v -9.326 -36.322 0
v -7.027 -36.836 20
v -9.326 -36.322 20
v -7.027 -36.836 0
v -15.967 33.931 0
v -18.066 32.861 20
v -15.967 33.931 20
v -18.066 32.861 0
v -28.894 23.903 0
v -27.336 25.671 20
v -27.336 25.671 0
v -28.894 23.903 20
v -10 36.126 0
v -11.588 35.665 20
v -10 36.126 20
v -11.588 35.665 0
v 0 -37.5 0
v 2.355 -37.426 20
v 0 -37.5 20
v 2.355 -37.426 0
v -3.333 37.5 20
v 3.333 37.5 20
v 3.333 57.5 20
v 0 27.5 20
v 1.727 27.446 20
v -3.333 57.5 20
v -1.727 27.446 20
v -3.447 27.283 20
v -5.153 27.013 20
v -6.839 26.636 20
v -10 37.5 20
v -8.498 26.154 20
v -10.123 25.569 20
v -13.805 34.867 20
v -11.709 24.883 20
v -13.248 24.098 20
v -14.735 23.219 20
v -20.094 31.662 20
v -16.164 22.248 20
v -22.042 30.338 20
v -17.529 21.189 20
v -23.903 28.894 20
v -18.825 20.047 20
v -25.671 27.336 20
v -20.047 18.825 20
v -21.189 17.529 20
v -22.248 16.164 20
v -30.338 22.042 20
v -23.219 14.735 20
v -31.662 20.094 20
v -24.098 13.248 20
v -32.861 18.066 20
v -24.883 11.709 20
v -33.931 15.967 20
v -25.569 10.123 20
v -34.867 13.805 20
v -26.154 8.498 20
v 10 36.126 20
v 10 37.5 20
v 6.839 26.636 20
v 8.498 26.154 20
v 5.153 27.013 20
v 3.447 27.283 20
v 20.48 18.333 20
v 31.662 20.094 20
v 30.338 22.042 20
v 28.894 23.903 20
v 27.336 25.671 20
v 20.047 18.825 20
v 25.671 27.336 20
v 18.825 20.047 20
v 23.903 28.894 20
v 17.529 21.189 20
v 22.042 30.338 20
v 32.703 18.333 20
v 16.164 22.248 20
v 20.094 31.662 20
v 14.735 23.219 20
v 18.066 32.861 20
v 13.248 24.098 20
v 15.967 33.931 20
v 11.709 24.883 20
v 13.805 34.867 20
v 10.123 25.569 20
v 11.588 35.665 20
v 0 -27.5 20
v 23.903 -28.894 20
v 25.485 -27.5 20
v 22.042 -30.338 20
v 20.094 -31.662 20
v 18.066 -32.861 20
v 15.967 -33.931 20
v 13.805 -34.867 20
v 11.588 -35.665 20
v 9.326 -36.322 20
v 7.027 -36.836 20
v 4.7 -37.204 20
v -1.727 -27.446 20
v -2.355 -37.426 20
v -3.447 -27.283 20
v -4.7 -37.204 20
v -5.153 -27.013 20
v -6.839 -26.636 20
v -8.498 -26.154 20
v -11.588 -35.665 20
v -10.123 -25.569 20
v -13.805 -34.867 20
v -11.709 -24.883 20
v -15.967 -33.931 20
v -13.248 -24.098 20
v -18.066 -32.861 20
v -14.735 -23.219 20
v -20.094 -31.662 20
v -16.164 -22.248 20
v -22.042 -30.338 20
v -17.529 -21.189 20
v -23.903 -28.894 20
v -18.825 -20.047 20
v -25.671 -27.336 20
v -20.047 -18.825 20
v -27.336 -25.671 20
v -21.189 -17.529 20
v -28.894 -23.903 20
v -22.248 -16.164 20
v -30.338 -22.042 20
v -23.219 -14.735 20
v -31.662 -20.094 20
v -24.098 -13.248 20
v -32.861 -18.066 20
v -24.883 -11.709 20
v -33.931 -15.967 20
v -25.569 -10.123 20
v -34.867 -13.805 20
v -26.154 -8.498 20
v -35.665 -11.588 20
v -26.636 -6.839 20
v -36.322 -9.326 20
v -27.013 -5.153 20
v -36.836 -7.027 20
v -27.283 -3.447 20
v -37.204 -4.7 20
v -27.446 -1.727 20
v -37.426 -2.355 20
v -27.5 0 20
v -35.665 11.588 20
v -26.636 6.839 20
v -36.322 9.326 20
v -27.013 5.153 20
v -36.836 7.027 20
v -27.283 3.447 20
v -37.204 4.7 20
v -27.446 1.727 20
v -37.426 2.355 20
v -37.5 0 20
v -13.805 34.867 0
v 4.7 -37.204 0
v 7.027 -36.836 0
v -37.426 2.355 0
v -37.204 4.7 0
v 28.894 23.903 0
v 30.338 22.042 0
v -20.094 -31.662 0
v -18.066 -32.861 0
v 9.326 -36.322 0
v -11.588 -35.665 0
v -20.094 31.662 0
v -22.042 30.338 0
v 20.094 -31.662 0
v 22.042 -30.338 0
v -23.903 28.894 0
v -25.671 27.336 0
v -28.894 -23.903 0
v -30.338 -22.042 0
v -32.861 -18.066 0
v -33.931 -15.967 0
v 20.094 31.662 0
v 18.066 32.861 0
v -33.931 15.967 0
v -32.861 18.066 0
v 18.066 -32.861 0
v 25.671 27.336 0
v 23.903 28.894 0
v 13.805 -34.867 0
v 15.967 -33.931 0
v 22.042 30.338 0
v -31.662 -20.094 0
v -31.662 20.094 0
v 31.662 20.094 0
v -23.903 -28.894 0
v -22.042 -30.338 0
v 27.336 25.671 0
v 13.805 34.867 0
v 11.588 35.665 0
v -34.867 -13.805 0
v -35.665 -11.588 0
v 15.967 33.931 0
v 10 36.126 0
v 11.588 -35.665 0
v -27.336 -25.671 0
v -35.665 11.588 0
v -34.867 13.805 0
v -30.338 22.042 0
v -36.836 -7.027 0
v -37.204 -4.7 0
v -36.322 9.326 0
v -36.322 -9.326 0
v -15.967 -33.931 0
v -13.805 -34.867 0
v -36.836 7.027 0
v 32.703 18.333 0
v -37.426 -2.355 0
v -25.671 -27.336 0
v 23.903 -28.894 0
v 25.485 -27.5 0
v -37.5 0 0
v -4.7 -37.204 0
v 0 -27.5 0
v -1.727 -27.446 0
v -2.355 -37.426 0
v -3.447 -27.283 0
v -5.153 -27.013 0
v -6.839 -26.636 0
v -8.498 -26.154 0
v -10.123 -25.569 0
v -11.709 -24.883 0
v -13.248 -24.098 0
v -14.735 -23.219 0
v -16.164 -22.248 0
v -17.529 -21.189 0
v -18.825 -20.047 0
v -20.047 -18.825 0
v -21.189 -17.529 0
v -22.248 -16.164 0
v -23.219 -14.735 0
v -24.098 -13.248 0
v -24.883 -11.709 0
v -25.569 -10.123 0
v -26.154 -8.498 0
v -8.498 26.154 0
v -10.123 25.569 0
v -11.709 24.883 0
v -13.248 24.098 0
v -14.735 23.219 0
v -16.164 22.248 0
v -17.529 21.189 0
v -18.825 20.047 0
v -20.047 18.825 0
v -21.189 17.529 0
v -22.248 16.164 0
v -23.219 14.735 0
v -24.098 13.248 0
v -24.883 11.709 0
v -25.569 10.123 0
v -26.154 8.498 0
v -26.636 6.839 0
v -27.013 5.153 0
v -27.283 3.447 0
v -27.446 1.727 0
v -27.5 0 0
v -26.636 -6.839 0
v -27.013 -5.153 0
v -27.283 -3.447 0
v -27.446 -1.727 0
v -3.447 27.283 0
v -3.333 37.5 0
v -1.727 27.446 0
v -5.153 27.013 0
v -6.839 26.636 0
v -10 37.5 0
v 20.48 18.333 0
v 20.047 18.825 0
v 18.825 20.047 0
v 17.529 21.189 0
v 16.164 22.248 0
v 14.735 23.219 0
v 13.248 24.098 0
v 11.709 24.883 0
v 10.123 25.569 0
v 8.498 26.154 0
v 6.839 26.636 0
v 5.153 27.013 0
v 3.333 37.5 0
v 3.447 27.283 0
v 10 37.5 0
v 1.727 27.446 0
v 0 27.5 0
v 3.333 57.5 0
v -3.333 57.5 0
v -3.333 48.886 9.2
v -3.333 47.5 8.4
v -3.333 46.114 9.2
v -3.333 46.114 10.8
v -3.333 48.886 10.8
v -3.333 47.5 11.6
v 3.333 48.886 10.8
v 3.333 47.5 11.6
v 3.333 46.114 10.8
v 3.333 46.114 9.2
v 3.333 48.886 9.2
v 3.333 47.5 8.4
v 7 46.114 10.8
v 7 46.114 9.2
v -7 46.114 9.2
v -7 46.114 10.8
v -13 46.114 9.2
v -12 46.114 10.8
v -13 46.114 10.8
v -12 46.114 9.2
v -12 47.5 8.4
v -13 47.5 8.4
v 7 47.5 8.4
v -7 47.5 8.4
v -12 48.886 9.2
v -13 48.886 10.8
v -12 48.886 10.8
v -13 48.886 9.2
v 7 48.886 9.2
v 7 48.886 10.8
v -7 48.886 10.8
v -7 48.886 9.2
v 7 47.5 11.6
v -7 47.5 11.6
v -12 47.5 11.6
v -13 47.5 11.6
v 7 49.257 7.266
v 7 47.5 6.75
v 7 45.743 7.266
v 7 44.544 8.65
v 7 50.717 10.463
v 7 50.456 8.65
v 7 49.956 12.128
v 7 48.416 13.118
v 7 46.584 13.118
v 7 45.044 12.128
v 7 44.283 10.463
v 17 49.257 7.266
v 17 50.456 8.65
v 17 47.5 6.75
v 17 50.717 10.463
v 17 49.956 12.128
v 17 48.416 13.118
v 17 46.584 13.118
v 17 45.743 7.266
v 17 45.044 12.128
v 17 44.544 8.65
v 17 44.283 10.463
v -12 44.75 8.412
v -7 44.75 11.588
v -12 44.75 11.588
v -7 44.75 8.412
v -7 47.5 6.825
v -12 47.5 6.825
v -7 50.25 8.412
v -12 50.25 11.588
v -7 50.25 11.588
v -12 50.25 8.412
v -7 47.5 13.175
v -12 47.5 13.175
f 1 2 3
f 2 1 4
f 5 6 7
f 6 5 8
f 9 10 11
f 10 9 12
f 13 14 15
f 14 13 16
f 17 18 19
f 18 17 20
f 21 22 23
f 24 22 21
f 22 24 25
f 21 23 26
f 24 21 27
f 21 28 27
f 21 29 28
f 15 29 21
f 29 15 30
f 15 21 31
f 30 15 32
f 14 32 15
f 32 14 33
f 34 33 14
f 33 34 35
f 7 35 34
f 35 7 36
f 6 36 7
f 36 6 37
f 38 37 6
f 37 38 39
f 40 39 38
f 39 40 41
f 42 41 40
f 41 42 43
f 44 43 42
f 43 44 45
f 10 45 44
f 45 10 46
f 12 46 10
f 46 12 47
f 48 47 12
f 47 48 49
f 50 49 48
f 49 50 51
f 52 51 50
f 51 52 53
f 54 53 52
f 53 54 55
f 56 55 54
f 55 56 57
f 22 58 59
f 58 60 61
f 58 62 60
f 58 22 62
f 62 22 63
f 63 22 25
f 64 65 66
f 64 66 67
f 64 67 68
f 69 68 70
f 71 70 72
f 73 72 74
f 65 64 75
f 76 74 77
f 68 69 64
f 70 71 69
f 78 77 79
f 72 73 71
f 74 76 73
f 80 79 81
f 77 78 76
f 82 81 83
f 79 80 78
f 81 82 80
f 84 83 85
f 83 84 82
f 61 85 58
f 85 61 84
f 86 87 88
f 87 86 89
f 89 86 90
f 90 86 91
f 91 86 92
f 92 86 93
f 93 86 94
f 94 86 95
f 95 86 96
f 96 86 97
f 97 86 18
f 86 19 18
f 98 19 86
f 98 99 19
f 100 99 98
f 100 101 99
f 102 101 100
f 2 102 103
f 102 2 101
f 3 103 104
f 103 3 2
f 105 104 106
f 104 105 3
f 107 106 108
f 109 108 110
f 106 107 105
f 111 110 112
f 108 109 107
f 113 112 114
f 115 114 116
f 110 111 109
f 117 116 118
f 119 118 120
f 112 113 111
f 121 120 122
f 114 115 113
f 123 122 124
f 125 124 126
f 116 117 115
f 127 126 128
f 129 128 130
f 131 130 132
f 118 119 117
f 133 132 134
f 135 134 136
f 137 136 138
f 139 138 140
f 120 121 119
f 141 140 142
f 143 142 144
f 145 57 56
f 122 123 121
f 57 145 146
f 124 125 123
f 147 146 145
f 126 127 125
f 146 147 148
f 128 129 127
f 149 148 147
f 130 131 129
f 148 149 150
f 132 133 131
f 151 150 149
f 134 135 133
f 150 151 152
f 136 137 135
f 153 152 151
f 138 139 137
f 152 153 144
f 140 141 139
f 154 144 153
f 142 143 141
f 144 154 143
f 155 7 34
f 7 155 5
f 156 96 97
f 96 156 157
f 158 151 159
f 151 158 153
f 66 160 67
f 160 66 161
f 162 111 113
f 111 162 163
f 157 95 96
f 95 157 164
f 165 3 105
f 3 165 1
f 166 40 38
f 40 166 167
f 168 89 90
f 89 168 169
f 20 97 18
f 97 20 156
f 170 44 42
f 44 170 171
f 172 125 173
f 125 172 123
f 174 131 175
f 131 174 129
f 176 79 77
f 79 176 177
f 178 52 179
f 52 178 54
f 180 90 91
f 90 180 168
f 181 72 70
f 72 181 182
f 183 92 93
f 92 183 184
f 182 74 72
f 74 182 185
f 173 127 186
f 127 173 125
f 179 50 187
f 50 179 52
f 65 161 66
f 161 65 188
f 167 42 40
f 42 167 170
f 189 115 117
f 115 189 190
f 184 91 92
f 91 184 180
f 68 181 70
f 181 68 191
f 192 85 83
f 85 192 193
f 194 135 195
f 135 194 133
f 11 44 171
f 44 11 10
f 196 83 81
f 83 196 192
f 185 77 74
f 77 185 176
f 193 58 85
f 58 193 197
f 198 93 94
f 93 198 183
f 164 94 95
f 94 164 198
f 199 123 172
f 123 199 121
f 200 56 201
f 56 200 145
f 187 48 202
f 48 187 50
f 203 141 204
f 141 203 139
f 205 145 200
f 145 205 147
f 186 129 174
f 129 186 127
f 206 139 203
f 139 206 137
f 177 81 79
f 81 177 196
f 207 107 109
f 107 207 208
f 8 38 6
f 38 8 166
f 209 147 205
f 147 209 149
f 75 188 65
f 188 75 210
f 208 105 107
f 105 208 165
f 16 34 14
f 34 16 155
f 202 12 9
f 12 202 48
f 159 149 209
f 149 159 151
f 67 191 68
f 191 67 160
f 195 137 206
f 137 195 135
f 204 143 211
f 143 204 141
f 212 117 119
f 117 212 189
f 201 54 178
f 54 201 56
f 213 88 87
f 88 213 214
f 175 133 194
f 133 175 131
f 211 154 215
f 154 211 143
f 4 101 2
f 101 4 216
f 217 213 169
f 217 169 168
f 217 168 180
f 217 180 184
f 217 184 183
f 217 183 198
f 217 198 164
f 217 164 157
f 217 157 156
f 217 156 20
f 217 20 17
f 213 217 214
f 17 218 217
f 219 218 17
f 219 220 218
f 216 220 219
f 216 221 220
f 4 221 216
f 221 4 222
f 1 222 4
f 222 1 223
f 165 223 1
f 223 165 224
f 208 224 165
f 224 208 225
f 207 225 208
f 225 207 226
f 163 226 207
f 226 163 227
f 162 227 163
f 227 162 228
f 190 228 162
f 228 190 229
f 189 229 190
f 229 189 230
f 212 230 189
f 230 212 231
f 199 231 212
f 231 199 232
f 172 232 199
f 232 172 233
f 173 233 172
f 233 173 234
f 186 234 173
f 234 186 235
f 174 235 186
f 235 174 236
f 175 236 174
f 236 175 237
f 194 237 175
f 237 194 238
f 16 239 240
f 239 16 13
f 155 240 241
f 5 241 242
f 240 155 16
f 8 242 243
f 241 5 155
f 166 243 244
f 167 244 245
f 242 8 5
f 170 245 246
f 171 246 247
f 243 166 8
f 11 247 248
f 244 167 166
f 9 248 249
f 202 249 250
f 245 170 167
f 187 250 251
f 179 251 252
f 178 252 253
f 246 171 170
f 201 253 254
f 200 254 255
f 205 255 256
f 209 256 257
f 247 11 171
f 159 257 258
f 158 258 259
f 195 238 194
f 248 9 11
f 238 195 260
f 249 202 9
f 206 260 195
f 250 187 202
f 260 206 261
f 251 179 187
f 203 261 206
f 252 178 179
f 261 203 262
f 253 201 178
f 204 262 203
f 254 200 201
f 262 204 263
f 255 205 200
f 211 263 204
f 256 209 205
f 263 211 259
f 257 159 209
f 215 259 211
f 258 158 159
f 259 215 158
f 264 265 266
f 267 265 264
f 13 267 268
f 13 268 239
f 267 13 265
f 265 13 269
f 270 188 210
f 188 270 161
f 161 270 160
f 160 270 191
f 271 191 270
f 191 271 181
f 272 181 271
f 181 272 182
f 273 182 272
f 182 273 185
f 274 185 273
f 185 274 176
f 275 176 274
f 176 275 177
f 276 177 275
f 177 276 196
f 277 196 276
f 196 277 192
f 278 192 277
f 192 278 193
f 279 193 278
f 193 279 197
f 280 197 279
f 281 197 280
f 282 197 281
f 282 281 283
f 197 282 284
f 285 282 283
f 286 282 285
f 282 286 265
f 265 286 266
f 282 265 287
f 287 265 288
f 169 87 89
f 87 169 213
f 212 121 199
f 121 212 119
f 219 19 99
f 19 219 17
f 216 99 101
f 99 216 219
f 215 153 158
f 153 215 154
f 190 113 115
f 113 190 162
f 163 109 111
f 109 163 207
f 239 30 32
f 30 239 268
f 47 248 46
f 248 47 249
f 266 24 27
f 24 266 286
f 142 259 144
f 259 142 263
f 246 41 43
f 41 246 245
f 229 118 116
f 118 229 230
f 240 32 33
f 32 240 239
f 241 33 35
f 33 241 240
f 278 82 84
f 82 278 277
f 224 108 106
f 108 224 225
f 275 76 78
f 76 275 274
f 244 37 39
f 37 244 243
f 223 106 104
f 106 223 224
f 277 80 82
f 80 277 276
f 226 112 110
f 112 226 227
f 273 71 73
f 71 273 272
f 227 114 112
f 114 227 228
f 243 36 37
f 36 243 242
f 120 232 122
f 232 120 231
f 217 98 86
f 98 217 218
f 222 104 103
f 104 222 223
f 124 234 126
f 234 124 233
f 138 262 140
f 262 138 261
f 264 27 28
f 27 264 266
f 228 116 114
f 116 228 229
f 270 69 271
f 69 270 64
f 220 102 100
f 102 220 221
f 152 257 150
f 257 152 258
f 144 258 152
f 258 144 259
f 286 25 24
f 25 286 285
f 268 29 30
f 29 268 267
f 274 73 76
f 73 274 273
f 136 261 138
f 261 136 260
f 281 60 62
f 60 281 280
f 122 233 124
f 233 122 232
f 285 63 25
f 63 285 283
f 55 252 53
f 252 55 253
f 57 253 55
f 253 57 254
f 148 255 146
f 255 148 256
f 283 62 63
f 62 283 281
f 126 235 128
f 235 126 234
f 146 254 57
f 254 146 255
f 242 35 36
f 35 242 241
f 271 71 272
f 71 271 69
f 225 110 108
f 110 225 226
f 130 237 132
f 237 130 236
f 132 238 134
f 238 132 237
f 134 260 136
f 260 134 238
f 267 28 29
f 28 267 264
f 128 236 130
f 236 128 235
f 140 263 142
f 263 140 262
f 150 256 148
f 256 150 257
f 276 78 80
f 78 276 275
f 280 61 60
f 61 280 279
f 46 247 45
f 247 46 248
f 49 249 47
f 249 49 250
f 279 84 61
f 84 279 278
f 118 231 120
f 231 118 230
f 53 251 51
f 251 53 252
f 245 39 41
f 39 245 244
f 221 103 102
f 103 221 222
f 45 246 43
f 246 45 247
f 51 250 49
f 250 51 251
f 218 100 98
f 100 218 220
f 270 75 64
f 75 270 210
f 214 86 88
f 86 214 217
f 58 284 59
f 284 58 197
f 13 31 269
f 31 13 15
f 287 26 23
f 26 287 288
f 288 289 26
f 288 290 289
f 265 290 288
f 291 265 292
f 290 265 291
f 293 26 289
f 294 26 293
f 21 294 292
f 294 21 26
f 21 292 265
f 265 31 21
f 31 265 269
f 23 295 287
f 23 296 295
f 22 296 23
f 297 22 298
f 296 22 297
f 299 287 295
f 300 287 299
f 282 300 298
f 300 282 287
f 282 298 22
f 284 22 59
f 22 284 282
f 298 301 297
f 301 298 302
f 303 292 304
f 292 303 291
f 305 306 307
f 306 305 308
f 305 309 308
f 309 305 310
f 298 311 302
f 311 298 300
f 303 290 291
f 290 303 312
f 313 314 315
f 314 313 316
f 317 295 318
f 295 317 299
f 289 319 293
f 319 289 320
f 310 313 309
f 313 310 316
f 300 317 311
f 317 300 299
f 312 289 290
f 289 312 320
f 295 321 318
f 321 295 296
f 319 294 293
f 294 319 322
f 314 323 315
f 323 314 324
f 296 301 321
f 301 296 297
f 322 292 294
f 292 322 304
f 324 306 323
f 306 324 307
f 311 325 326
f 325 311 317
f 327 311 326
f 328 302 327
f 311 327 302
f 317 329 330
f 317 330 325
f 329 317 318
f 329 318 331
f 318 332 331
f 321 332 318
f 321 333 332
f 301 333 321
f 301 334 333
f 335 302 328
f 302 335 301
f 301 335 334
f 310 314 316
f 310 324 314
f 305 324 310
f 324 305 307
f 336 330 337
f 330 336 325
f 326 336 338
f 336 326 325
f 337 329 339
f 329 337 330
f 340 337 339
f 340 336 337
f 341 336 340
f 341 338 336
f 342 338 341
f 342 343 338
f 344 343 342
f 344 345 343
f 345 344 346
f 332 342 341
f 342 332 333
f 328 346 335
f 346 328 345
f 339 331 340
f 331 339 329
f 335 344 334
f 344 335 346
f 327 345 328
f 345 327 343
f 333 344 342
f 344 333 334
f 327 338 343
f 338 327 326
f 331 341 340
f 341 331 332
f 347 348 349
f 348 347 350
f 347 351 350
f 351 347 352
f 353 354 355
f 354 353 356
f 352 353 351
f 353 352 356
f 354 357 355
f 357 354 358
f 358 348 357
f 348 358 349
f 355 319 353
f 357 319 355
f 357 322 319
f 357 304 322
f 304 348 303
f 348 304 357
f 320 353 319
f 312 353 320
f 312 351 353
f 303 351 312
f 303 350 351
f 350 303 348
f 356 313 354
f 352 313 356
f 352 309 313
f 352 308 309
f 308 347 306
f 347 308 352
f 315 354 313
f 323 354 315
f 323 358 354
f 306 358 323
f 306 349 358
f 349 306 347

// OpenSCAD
// file: ../deps/nutsnbolts/data-access.scad
// Norm Nuts and Bolts - a OpenSCAD library
// Copyright (C) 2012  Johannes Kneer

// This program is free software: you can redistribute it and/or modify
// it under the terms of the GNU General Public License as published by
// the Free Software Foundation, either version 3 of the License, or
// (at your option) any later version.

// This program is distributed in the hope that it will be useful,
// but WITHOUT ANY WARRANTY; without even the implied warranty of
// MERCHANTABILITY or FITNESS FOR A PARTICULAR PURPOSE.  See the
// GNU General Public License for more details.

// You should have received a copy of the GNU General Public License
// along with this program.  If not, see <http://www.gnu.org/licenses/>.


// DATABASE ACCESS FUNCTIONS AND CONSTANTS



// == CONSTANTS ==

// screw table access keys
_NB_S_DESC            = 0;
_NB_S_FAMKEY			    = 1;
_NB_S_LENGTH          = 2;
_NB_S_NOTHREAD_LENGTH = 3;

_NB_F_DESC			      = 0;
_NB_F_OUTER_DIA       = 1;
_NB_F_INNER_DIA       = 2;
_NB_F_LEAD            = 3;
_NB_F_KEY             = 4;
_NB_F_KEY_DEPTH       = 5;
_NB_F_HEAD_HEIGHT     = 6;
_NB_F_HEAD_DIA        = 7;
_NB_F_NUT_KEY         = 8;
_NB_F_NUT_HEIGHT      = 9;
_NB_F_PITCH_FINE      = 10;
_NB_F_PITCH_MEDIUM    = 11;
_NB_F_PITCH_COARSE    = 12;


// == FUNCTIONS ==

// _get_screw("descriptor")   with descriptor = M8x25
//   find the line for a general object in the data matrix

function _get_screw(n) = data_screw[search([n], data_screw)[0]];
function _get_screw_fam(n) = data_screw_fam[search([_get_screw(n)[_NB_S_FAMKEY]], data_screw_fam)[0]];

function _get_fam(n) = data_screw_fam[search([n], data_screw_fam)[0]];


// _get_XXXXX("descriptor") functions
// find a single property in the database

function _get_desc(n)        = _get_screw(n)[_NB_S_DESC];
function _get_famkey(n)         = _get_screw(n)[_NB_S_FAMKEY];
function _get_length(n)      = _get_screw(n)[_NB_S_LENGTH];
function _get_nt_length(n)   = _get_screw(n)[_NB_S_NOTHREAD_LENGTH];

function _get_outer_dia(n)   = _get_screw_fam(n)[_NB_F_OUTER_DIA];
function _get_inner_dia(n)   = _get_screw_fam(n)[_NB_F_INNER_DIA];
function _get_lead(n)        = _get_screw_fam(n)[_NB_F_LEAD];
function _get_head_height(n) = _get_screw_fam(n)[_NB_F_HEAD_HEIGHT];
function _get_head_dia(n)    = _get_screw_fam(n)[_NB_F_HEAD_DIA];
function _get_nut_key(n)     = _get_screw_fam(n)[_NB_F_NUT_KEY];
function _get_nut_height(n)  = _get_screw_fam(n)[_NB_F_NUT_HEIGHT];
function _get_fine_pitch(n)  = _get_screw_fam(n)[_NB_F_PITCH_FINE];
function _get_medium_pitch(n)  = _get_screw_fam(n)[_NB_F_PITCH_MEDIUM];
function _get_coarse_pitch(n)  = _get_screw_fam(n)[_NB_F_PITCH_COARSE];
// file: polyScrewThread_r1.scad
/*
 *    polyScrewThread_r1.scad    by aubenc @ Thingiverse
 *
 * This script contains the library modules that can be used to generate
 * threaded rods, screws and nuts.
 *
 * http://www.thingiverse.com/thing:8796
 *
 * CC Public Domain
 */

module screw_thread(od,st,lf0,lt,rs,cs)
{
    or=od/2;
    ir=or-st/2*cos(lf0)/sin(lf0);
    pf=2*PI*or;
//    sn=floor(pf/rs);
    sn = 90;
    lfxy=360/sn;
    ttn=round(lt/st+1);
    zt=st/sn;

    intersection()
    {
        if (cs >= -1)
        {
           thread_shape(cs,lt,or,ir,sn,st);
        }

        full_thread(ttn,st,sn,zt,lfxy,or,ir);
    }
}

module hex_nut(df,hg,sth,clf,cod,crs)
{

    difference()
    {
        hex_head(hg,df);

        hex_countersink_ends(sth/2,cod,clf,crs,hg);

        screw_thread(cod,sth,clf,hg,crs,-2);
    }
}


module hex_screw(od,st,lf0,lt,rs,cs,df,hg,ntl,ntd)
{
    ntr=od/2-(st/2)*cos(lf0)/sin(lf0);

    union()
    {
        hex_head(hg,df);

        translate([0,0,hg])
        if ( ntl == 0 )
        {
            cylinder(h=0.01, r=ntr, center=true);
        }
        else
        {
            if ( ntd == -1 )
            {
                cylinder(h=ntl+0.01, r=ntr, $fn=floor(od*PI/rs), center=false);
            }
            else if ( ntd == 0 )
            {
                union()
                {
                    cylinder(h=ntl-st/2,
                             r=od/2, $fn=floor(od*PI/rs), center=false);

                    translate([0,0,ntl-st/2])
                    cylinder(h=st/2,
                             r1=od/2, r2=ntr, 
                             $fn=floor(od*PI/rs), center=false);
                }
            }
            else
            {
                cylinder(h=ntl, r=ntd/2, $fn=ntd*PI/rs, center=false);
            }
        }

        translate([0,0,ntl+hg]) screw_thread(od,st,lf0,lt,rs,cs);
    }
}

module hex_screw_0(od,st,lf0,lt,rs,cs,df,hg,ntl,ntd)
{
    ntr=od/2-(st/2)*cos(lf0)/sin(lf0);

    union()
    {
        hex_head_0(hg,df);

        translate([0,0,hg])
        if ( ntl == 0 )
        {
            cylinder(h=0.01, r=ntr, center=true);
        }
        else
        {
            if ( ntd == -1 )
            {
                cylinder(h=ntl+0.01, r=ntr, $fn=floor(od*PI/rs), center=false);
            }
            else if ( ntd == 0 )
            {
                union()
                {
                    cylinder(h=ntl-st/2,
                             r=od/2, $fn=floor(od*PI/rs), center=false);

                    translate([0,0,ntl-st/2])
                    cylinder(h=st/2,
                             r1=od/2, r2=ntr, 
                             $fn=floor(od*PI/rs), center=false);
                }
            }
            else
            {
                cylinder(h=ntl, r=ntd/2, $fn=ntd*PI/rs, center=false);
            }
        }

        translate([0,0,ntl+hg]) screw_thread(od,st,lf0,lt,rs,cs);
    }
}

module thread_shape(cs,lt,or,ir,sn,st)
{
    if ( cs == 0 )
    {
        cylinder(h=lt, r=or, $fn=sn, center=false);
    }
    else
    {
        union()
        {
            translate([0,0,st/2])
              cylinder(h=lt-st+0.005, r=or, $fn=sn, center=false);

            if ( cs == -1 || cs == 2 )
            {
                cylinder(h=st/2, r1=ir, r2=or, $fn=sn, center=false);
            }
            else
            {
                cylinder(h=st/2, r=or, $fn=sn, center=false);
            }

            translate([0,0,lt-st/2])
            if ( cs == 1 || cs == 2 )
            {
                  cylinder(h=st/2, r1=or, r2=ir, $fn=sn, center=false);
            }
            else
            {
                cylinder(h=st/2, r=or, $fn=sn, center=false);
            }
        }
    }
}

module full_thread(ttn,st,sn,zt,lfxy,or,ir)
{
  if(ir >= 0.2)
  {
    for(i=[0:ttn-1])
    {
        for(j=[0:sn-1])
			assign( pt = [	[0,                  0,                  i*st-st            ],
                        [ir*cos(j*lfxy),     ir*sin(j*lfxy),     i*st+j*zt-st       ],
                        [ir*cos((j+1)*lfxy), ir*sin((j+1)*lfxy), i*st+(j+1)*zt-st   ],
								[0,0,i*st],
                        [or*cos(j*lfxy),     or*sin(j*lfxy),     i*st+j*zt-st/2     ],
                        [or*cos((j+1)*lfxy), or*sin((j+1)*lfxy), i*st+(j+1)*zt-st/2 ],
                        [ir*cos(j*lfxy),     ir*sin(j*lfxy),     i*st+j*zt          ],
                        [ir*cos((j+1)*lfxy), ir*sin((j+1)*lfxy), i*st+(j+1)*zt      ],
                        [0,                  0,                  i*st+st            ]	])
        {
            polyhedron(points=pt,
              		  triangles=[	[1,0,3],[1,3,6],[6,3,8],[1,6,4],
											[0,1,2],[1,4,2],[2,4,5],[5,4,6],[5,6,7],[7,6,8],
											[7,8,3],[0,2,3],[3,2,7],[7,2,5]	]);
        }
    }
  }
  else
  {
    echo("Step Degrees too agresive, the thread will not be made!!");
    echo("Try to increase de value for the degrees and/or...");
    echo(" decrease the pitch value and/or...");
    echo(" increase the outer diameter value.");
  }
}

module hex_head(hg,df)
{
	rd0=df/2/sin(60);
	x0=0;	x1=df/2;	x2=x1+hg/2;
	y0=0;	y1=hg/2;	y2=hg;

	intersection()
	{
	   cylinder(h=hg, r=rd0, $fn=6, center=false);

		rotate_extrude(convexity=10, $fn=6*round(df*PI/6/0.5))
		polygon([ [x0,y0],[x1,y0],[x2,y1],[x1,y2],[x0,y2] ]);
	}
}

module hex_head_0(hg,df)
{
    cylinder(h=hg, r=df/2/sin(60), $fn=6, center=false);
}

module hex_countersink_ends(chg,cod,clf,crs,hg)
{
    translate([0,0,-0.1])
    cylinder(h=chg+0.01, 
             r1=cod/2, 
             r2=cod/2-(chg+0.1)*cos(clf)/sin(clf),
             $fn=floor(cod*PI/crs), center=false);

    translate([0,0,hg-chg+0.1])
    cylinder(h=chg+0.01, 
             r1=cod/2-(chg+0.1)*cos(clf)/sin(clf),
             r2=cod/2, 
             $fn=floor(cod*PI/crs), center=false);
}
// file: utils.scad
include <settings.scad>
include <polyScrewThread_r1.scad>

module screw(diameter) {
       hex_screw(diameter,4,55,100,1.5,2,24,8,0,0);
 
}

module big_screw() {
       screw(10);
}

module medium_screw() {
       screw(8);
}
// file: settings.scad
//// Parametrics settings

RingNumberOfTeeth=100;
DriverNumberOfTeeth=6;

ClampThickness=20;


// this is the diameter of the hole inside the clamp
ClampDiameter=55; 


ClampLength=30;
ClampZone=20;

GrooveWidth=5;

fn=100;


RingThickness = 20; 
RingDiameter=140;

Tolerance=0.1;
// main file
include <settings.scad>
include <utils.scad>

include <../deps/nutsnbolts/cyl_head_bolt.scad>

module clamp_screw() {
    rotate([0, 90, 0]) {
  translate([-ClampThickness/2, ClampLength + ClampDiameter/2 - ClampZone/2, -5]) {
            translate([0, 0, 22]) {
               hole_through(name="M3", l=20, cl=0.1, h=10, hcl=0.4); 
            }
            translate([0, 0, -2]) {
                nutcatch_parallel("M3", l=5);
            }
            }
        }
}

module clamp() {
    difference(){
        cylinder(ClampThickness, ClampDiameter/2+ClampThickness/2, ClampDiameter/2+ClampThickness/2, $fn=fn);
        cylinder(ClampThickness, ClampDiameter/2, ClampDiameter/2, $fn=fn);
        translate([0, -ClampDiameter/2, 0]) cube([ClampDiameter, ClampDiameter/1.2, ClampThickness]);
        translate([0,-100, ClampThickness/2]) rotate([-90, 0, 0]) big_screw();
     } ;
     difference() {
         translate([-ClampThickness/2, ClampDiameter/2, 0]) {
            difference(){
                cube([ClampThickness, ClampLength, ClampThickness]);
                translate([0, ClampLength-ClampZone, 0])cube([ClampThickness/3, ClampLength, ClampThickness]);
                translate([ClampThickness - ClampThickness/3, ClampLength-ClampZone, 0]) cube([ClampThickness/3, ClampLength, ClampThickness]);
             
            }          
        }
        clamp_screw();
    }
	 
};

clamp();
clamp_screw();
